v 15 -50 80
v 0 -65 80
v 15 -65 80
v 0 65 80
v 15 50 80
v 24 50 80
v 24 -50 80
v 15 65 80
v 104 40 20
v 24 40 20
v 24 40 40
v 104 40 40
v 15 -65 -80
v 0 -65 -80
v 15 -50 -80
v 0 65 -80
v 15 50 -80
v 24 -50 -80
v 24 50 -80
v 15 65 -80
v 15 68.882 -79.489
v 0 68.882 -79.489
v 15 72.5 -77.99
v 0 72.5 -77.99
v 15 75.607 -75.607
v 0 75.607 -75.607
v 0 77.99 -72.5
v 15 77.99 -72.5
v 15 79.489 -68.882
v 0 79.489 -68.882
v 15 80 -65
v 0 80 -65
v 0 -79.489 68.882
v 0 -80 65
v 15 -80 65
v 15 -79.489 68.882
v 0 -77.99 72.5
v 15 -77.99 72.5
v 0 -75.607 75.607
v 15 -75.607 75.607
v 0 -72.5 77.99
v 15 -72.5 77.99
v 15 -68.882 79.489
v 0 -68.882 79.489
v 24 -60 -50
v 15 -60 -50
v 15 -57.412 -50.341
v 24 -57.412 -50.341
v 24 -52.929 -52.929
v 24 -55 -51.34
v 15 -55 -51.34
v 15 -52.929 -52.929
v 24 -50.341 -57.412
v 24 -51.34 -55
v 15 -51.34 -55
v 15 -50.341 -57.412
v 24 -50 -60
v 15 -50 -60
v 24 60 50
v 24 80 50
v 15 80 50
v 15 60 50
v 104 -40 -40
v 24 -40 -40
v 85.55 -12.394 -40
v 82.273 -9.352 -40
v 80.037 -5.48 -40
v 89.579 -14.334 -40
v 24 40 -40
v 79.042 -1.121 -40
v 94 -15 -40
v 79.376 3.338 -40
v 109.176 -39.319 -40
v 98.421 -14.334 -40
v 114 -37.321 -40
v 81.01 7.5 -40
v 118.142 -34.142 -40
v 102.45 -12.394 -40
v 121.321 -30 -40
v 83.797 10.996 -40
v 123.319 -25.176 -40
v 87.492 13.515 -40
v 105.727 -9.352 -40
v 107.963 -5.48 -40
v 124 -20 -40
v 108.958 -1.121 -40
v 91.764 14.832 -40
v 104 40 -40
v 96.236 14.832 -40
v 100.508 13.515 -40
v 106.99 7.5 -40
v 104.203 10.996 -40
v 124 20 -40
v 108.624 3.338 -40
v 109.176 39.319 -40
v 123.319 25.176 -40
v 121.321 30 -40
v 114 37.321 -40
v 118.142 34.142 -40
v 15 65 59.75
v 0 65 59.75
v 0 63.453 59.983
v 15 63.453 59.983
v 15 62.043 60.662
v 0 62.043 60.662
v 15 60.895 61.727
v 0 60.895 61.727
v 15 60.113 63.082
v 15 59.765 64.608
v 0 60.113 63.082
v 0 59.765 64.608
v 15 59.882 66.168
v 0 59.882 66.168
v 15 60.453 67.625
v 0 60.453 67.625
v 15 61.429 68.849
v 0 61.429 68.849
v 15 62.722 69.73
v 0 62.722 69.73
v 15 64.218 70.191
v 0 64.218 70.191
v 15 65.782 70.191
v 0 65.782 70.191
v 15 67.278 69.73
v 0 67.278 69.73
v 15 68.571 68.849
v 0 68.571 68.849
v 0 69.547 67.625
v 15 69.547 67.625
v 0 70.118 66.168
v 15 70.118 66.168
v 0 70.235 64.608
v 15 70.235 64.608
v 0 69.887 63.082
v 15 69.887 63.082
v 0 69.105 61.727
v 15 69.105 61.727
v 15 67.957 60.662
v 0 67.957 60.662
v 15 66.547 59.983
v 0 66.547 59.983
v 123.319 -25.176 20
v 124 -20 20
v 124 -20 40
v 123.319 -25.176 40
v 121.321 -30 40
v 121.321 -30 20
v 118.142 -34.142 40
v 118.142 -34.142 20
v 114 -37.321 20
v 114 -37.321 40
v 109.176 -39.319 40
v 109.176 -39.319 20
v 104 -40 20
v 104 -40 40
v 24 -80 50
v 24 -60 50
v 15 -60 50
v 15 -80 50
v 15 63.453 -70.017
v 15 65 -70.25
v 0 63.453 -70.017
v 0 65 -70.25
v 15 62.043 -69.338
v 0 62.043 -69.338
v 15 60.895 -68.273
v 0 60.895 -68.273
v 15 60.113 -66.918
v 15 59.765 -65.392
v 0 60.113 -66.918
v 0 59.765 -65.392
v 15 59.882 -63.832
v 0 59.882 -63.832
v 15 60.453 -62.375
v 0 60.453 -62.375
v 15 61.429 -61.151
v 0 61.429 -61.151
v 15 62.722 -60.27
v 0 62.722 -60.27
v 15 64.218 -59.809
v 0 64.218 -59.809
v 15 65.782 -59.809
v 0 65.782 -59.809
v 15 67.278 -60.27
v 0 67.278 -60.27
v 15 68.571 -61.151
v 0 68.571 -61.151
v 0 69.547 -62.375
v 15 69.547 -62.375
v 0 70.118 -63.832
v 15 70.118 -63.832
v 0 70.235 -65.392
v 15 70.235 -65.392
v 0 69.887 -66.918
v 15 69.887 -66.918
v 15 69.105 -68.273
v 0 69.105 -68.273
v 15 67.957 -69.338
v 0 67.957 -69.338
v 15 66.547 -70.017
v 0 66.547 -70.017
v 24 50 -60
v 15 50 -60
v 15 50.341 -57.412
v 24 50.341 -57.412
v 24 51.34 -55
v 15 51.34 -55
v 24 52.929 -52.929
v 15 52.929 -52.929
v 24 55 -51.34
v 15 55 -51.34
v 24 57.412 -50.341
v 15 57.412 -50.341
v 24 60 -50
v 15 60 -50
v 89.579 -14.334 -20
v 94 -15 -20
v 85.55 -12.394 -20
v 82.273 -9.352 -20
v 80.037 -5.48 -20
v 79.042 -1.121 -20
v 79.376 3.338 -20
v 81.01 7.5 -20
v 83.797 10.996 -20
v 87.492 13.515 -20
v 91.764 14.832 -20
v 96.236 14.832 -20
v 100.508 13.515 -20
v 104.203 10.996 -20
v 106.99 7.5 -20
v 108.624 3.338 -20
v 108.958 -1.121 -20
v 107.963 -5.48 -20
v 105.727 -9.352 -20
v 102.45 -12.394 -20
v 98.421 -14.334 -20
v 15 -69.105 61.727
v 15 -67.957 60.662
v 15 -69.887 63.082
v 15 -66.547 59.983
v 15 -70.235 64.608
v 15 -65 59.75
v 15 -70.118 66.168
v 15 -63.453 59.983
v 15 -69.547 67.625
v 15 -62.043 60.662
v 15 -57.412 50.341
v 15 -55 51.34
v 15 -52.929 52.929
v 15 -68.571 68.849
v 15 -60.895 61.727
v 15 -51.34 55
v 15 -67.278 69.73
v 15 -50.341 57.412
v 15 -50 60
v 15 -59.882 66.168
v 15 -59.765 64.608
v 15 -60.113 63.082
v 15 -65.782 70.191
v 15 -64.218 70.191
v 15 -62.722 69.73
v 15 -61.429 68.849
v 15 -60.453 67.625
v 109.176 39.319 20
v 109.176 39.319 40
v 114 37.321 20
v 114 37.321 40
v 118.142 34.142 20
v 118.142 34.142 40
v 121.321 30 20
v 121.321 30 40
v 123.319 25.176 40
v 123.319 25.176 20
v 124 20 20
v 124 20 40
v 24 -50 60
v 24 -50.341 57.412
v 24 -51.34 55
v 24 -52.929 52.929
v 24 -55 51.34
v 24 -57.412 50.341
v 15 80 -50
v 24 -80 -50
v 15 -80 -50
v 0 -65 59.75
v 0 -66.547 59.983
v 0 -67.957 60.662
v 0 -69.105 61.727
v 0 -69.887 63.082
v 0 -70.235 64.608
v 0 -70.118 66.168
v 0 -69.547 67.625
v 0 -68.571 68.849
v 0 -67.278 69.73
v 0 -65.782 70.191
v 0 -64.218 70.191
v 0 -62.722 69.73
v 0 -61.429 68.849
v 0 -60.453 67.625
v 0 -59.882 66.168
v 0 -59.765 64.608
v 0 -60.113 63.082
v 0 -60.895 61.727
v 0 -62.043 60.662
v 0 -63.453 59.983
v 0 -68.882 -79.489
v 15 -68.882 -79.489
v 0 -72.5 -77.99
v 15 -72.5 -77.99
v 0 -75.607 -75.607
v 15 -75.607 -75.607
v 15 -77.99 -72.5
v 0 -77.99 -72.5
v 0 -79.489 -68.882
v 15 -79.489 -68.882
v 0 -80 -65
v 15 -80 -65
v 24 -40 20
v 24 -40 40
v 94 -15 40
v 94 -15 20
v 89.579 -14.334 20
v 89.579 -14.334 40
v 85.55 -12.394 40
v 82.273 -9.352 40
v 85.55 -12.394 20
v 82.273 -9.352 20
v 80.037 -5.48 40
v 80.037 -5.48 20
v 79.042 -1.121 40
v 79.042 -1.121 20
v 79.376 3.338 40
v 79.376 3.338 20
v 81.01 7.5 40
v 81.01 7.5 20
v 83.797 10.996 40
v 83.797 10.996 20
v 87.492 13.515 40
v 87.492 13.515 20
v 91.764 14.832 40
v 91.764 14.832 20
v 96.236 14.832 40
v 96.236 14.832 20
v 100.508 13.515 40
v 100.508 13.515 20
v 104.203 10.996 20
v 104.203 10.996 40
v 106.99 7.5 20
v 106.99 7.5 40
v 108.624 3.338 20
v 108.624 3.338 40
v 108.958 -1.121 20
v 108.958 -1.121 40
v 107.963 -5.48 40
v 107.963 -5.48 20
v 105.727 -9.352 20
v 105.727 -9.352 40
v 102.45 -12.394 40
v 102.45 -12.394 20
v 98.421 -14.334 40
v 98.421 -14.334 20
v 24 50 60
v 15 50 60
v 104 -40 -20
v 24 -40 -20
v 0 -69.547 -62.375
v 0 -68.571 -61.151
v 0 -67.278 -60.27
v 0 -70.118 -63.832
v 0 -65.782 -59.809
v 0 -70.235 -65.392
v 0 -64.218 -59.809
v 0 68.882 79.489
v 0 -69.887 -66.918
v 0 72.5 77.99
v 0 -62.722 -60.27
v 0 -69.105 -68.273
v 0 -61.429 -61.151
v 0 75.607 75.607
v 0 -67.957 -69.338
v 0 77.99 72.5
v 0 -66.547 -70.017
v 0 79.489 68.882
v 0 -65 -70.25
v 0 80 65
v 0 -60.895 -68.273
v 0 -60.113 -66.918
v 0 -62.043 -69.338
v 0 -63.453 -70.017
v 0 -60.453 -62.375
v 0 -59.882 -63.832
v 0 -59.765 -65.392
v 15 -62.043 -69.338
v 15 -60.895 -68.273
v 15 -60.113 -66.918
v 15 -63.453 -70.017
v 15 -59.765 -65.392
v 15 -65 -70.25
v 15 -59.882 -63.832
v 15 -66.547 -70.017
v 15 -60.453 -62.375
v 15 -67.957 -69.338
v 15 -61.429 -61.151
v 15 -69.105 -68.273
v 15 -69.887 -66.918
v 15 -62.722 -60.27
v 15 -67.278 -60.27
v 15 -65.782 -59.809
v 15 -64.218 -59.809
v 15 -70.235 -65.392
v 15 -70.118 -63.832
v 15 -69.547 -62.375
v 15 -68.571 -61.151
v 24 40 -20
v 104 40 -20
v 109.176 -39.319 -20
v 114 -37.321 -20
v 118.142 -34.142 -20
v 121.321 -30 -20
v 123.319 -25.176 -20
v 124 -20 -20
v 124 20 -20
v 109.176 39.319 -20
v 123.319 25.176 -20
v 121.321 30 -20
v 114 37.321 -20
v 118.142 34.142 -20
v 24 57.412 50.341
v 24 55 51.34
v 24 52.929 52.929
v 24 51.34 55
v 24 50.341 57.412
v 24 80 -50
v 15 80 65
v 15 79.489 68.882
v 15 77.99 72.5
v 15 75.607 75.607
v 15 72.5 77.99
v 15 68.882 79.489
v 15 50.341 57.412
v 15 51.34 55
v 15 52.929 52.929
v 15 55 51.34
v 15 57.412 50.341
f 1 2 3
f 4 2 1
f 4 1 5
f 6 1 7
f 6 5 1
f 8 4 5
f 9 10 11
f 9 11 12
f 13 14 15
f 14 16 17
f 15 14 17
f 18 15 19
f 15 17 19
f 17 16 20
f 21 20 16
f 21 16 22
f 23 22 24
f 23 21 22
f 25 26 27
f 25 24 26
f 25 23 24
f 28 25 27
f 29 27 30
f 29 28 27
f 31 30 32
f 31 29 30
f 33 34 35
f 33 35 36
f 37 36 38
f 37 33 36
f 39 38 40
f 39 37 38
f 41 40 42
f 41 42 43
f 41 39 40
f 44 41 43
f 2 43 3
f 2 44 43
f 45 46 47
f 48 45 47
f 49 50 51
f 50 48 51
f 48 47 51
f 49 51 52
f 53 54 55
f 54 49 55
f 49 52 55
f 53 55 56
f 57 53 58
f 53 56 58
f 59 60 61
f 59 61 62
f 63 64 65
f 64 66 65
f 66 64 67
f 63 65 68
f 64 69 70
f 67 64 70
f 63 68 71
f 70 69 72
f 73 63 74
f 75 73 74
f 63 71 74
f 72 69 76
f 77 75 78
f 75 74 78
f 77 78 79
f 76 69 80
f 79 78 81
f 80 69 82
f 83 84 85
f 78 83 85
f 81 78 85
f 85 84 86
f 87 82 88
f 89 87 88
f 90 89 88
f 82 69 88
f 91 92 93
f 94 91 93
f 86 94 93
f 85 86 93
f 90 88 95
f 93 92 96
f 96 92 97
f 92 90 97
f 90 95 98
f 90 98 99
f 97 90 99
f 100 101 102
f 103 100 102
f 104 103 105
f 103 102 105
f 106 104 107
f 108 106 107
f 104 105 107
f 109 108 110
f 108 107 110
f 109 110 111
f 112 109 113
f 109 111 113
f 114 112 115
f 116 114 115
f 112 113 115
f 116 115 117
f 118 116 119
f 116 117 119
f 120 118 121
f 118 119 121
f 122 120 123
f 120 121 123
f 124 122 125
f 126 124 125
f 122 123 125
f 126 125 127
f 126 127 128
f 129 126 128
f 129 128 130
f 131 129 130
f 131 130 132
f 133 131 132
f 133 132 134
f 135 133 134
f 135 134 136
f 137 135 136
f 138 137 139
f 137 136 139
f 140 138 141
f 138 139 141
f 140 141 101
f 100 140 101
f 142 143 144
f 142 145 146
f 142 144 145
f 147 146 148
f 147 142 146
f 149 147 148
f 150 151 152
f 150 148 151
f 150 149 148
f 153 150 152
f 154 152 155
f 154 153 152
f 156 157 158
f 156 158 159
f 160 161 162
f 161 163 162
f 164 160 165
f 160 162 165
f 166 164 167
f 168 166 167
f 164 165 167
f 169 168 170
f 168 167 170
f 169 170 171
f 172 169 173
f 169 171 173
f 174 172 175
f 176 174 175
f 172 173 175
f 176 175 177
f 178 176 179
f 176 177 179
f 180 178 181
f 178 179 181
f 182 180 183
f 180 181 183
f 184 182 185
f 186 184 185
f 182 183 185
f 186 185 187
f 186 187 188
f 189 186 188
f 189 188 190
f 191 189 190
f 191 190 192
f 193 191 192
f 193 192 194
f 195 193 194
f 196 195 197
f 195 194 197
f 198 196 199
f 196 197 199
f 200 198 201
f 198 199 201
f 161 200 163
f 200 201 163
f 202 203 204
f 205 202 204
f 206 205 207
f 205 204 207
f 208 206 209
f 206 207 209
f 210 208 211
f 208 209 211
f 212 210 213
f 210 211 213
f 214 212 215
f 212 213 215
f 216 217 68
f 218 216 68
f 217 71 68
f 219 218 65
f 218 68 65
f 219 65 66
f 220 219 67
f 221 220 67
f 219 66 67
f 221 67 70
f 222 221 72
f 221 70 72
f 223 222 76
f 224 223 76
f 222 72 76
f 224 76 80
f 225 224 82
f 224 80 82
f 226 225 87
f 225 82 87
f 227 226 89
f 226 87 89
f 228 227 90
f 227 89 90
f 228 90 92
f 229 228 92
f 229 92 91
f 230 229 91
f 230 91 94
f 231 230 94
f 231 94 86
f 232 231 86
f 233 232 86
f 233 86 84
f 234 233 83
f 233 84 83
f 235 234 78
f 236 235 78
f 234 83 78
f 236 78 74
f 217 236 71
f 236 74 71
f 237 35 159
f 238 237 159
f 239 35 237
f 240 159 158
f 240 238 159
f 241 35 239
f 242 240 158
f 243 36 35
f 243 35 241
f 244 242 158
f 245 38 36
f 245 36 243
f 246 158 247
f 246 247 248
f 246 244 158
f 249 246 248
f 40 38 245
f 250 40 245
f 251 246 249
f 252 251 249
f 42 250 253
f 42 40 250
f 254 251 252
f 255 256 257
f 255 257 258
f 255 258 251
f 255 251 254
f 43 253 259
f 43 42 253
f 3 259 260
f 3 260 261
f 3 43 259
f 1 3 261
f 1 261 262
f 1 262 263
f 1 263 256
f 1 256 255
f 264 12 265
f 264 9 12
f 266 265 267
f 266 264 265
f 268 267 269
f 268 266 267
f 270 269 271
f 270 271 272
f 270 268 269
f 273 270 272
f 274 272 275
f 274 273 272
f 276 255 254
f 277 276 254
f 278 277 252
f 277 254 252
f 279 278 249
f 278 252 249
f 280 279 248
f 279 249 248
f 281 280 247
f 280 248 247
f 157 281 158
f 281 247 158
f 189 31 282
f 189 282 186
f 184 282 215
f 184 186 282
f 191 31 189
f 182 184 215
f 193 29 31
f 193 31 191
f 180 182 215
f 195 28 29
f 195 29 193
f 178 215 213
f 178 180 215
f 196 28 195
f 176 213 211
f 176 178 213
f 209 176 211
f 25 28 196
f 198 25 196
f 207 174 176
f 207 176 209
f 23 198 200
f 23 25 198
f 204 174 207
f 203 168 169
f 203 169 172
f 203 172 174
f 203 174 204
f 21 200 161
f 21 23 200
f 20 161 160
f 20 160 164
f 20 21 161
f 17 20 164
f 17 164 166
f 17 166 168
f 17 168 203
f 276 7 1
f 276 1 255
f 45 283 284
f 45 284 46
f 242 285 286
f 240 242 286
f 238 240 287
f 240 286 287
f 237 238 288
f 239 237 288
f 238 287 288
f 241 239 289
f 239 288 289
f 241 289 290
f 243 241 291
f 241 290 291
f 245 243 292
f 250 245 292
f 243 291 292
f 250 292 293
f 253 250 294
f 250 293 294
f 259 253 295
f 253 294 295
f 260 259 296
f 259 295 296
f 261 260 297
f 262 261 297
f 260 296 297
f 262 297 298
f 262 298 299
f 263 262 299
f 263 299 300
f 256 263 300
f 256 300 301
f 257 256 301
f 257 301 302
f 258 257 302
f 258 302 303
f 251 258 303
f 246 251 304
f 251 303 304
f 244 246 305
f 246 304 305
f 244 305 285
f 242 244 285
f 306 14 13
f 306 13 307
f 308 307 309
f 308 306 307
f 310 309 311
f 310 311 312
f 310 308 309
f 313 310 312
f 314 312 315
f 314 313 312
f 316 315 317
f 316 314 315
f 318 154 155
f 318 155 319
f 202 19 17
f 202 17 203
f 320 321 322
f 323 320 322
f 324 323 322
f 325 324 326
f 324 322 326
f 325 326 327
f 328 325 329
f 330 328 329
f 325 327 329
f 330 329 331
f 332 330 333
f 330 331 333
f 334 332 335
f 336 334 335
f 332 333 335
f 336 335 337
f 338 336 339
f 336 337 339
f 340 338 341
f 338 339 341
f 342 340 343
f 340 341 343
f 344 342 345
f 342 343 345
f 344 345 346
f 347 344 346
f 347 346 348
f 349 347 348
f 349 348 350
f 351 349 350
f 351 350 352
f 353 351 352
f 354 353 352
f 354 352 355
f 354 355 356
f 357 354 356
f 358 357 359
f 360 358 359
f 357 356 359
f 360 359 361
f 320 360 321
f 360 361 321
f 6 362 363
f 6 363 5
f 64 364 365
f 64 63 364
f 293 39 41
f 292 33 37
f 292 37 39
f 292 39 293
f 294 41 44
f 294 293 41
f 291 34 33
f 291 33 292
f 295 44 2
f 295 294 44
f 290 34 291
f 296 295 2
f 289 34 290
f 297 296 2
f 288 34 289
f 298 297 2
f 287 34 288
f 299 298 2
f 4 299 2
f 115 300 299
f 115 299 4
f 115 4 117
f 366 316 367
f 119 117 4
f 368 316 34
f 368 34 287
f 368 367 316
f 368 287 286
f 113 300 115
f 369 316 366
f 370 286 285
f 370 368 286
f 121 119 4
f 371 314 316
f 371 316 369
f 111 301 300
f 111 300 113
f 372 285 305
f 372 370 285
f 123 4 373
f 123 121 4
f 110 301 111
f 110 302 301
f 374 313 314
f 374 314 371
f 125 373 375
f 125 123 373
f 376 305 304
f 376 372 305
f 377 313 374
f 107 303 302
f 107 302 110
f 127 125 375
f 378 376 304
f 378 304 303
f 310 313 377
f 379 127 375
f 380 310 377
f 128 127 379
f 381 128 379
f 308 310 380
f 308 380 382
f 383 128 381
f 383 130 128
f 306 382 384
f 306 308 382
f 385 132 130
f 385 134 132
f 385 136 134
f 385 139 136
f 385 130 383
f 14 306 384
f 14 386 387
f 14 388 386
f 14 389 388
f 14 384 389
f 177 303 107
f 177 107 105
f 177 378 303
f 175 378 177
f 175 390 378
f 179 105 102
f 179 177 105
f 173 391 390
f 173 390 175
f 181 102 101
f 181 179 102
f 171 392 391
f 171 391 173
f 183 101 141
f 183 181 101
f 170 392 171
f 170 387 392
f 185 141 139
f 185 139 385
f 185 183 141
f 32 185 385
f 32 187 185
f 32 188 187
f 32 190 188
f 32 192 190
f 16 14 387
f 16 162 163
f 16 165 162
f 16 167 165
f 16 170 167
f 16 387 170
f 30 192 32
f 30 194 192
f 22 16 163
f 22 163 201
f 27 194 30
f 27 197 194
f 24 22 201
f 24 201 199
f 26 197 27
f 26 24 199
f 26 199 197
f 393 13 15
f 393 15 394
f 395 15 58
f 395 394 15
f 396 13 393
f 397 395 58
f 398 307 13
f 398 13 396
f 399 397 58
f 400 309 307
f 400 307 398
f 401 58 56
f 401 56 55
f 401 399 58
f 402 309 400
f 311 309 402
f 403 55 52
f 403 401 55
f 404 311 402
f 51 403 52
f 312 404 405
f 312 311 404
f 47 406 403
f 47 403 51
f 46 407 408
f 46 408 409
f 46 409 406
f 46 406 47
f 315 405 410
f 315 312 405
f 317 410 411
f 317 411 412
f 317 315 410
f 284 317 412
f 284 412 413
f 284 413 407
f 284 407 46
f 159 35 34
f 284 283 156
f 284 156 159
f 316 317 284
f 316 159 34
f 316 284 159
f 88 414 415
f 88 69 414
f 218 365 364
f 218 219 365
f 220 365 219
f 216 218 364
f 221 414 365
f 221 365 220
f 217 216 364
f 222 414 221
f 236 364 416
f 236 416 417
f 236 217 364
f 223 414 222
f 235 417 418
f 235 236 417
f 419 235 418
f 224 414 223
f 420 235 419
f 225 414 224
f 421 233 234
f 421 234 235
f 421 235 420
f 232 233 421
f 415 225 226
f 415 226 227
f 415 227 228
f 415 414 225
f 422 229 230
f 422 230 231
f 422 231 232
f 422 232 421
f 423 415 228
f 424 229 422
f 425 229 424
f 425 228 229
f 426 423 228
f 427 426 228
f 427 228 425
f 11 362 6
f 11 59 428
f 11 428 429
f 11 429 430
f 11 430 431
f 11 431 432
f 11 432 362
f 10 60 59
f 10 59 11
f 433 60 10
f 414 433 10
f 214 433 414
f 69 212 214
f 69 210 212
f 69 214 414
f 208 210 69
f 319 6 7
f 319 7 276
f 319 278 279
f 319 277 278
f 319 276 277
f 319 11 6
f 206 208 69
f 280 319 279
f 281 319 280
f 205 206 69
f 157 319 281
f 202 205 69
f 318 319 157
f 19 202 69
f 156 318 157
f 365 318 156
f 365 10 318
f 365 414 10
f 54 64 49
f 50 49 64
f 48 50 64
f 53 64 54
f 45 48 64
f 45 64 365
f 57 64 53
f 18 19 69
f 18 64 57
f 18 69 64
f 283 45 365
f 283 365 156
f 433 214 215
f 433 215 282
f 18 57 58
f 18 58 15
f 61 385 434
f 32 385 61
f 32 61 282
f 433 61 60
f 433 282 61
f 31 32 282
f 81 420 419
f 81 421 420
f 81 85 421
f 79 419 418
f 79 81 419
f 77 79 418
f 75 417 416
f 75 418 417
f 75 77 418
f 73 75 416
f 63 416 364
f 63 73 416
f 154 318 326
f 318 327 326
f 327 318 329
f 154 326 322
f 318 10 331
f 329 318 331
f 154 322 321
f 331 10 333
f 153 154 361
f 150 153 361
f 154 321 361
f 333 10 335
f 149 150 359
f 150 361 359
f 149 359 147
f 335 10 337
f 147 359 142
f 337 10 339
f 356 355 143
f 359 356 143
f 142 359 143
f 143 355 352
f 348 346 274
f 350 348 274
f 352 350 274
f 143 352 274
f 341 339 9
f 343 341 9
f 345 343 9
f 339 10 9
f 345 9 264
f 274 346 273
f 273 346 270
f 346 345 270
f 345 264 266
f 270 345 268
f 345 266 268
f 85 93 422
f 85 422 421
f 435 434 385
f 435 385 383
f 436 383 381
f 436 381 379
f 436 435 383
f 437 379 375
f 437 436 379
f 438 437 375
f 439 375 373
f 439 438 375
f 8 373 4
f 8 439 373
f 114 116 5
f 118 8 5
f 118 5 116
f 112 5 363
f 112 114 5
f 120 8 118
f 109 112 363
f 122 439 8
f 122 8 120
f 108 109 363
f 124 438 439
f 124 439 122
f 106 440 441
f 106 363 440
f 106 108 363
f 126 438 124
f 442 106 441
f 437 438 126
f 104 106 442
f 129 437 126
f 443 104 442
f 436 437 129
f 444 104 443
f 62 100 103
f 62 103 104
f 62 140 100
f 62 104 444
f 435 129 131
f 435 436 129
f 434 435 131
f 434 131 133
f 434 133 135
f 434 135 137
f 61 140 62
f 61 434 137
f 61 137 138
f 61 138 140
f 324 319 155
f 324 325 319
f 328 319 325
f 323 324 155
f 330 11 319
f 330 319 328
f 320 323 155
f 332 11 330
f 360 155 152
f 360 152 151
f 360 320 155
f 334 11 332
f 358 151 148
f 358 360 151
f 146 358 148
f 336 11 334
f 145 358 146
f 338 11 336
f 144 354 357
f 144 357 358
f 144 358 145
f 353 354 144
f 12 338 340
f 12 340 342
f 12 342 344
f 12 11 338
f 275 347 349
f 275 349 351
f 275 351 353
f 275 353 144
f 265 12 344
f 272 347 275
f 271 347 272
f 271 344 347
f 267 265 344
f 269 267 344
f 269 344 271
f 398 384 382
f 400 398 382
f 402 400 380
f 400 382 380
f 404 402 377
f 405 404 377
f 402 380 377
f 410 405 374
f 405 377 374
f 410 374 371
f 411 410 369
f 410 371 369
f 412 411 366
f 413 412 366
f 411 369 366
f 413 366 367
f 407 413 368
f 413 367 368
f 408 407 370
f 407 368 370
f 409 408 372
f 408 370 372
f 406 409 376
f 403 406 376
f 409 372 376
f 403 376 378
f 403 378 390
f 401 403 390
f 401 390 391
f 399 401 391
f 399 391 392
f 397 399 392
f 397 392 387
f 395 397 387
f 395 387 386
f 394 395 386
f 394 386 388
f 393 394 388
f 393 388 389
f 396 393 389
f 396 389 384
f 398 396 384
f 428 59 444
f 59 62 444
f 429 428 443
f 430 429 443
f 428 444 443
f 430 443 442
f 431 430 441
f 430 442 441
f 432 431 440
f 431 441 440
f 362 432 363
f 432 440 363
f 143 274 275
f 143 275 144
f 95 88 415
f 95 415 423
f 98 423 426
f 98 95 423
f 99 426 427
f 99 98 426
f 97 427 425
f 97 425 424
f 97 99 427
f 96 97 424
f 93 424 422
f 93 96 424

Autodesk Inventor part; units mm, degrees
ref_plane "YZ Plane" through (0, 0, 0) normal (1, 0, 0) x (0, 1, 0)
ref_plane "XZ Plane" through (0, 0, 0) normal (0, 1, 0) x (-1, 0, 0)
ref_plane "XY Plane" through (0, 0, 0) normal (0, 0, 1) x (1, 0, 0)
sketch "Skizze1" plane through (0, 0, 0) normal (0, 0, 1) x (1, 0, 0)
  line L0 (0, 80) -> (24, 80)
  line L1 (24, 80) -> (24, -80)
  line L2 (24, -80) -> (0, -80)
  line L3 (0, -80) -> (0, 80)
  line L4 (24, 40) -> (124, 40)
  line L5 (124, 40) -> (124, -40)
  line L6 (124, -40) -> (24, -40)
  line L7 (24, -40) -> (24, 40)
  point P0 (0, 0)
  point P1 (24, 0)
  point P2 (0, 0)
  point P3 (94, 0)
  point P4 (124, 0)
  dimension "d0" = 160
  dimension "d1" = 24
  dimension "d2" = 124
  dimension "d3" = 80
  dimension "d4" = 94
extrude "Extrusion1" add sketch "Skizze1" along normal mid plane 160 contours L0 L1 L2 L3
extrude "Extrusion2" add sketch "Skizze1" along normal mid plane 80 contours L4 L5 L6 L1
extrude "Extrusion3" cut sketch "Skizze1" along normal mid plane 40 contours L4 L5 L6 L1
fillet "Rundung1" radius 20 4 edges at (124, 40, 30) (124, 40, -30) (124, -40, -30) (124, -40, 30)
hole "Bohrung1" at (94, 0, 0) direction (0, 0, -1) diameter 30 end through all both
sketch "Skizze2" plane through (24, -80, 80) normal (1, 0, 0) x (0, 0, -1)
  line L0 (0, 160) -> (30, 160)
  line L1 (30, 160) -> (30, 130)
  line L2 (30, 130) -> (0, 130)
  line L3 (0, 130) -> (0, 160)
  point P0 (80, 80)
  dimension "d19" = 30
  dimension "d20" = 30
extrude "Extrusion4" cut sketch "Skizze2" against normal blind 9
pattern_circular "Runde Anordnung1" count 4 over 360 about axis through (-10, 0, 0) along (1, 0, 0) of "Extrusion4"
sketch "Skizze3" plane through (24, 50, 50) normal (1, 0, 0) x (0, 0, -1)
  line L0 (-15, 15) -> (115, 15)
  line L1 (115, 15) -> (115, -115)
  line L2 (115, -115) -> (-15, -115)
  line L3 (-15, -115) -> (-15, 15)
  line L4 (-15, 15) -> (115, -115) construction
  line L5 (115, 15) -> (-15, -115) construction
  point P0 (50, -50)
  dimension "d26" = 130
  dimension "d27" = 130
hole "Bohrung2" at (24, 65, 65) at (24, -65, 65) at (24, 65, -65) at (24, -65, -65) direction (-1, 0, 0) diameter 10.5 end through all
fillet "Rundung2" radius 15 4 edges at (7.5, 80, -80) (7.5, -80, -80) (7.5, -80, 80) (7.5, 80, 80)
fillet "Rundung3" radius 10 4 edges at (19.5, -50, 50) (19.5, -50, -50) (19.5, 50, -50) (19.5, 50, 50)
equation "\"d5\" = d0"
properties part number "Befestigungsflansch" material "Stahl AISI 4130"
